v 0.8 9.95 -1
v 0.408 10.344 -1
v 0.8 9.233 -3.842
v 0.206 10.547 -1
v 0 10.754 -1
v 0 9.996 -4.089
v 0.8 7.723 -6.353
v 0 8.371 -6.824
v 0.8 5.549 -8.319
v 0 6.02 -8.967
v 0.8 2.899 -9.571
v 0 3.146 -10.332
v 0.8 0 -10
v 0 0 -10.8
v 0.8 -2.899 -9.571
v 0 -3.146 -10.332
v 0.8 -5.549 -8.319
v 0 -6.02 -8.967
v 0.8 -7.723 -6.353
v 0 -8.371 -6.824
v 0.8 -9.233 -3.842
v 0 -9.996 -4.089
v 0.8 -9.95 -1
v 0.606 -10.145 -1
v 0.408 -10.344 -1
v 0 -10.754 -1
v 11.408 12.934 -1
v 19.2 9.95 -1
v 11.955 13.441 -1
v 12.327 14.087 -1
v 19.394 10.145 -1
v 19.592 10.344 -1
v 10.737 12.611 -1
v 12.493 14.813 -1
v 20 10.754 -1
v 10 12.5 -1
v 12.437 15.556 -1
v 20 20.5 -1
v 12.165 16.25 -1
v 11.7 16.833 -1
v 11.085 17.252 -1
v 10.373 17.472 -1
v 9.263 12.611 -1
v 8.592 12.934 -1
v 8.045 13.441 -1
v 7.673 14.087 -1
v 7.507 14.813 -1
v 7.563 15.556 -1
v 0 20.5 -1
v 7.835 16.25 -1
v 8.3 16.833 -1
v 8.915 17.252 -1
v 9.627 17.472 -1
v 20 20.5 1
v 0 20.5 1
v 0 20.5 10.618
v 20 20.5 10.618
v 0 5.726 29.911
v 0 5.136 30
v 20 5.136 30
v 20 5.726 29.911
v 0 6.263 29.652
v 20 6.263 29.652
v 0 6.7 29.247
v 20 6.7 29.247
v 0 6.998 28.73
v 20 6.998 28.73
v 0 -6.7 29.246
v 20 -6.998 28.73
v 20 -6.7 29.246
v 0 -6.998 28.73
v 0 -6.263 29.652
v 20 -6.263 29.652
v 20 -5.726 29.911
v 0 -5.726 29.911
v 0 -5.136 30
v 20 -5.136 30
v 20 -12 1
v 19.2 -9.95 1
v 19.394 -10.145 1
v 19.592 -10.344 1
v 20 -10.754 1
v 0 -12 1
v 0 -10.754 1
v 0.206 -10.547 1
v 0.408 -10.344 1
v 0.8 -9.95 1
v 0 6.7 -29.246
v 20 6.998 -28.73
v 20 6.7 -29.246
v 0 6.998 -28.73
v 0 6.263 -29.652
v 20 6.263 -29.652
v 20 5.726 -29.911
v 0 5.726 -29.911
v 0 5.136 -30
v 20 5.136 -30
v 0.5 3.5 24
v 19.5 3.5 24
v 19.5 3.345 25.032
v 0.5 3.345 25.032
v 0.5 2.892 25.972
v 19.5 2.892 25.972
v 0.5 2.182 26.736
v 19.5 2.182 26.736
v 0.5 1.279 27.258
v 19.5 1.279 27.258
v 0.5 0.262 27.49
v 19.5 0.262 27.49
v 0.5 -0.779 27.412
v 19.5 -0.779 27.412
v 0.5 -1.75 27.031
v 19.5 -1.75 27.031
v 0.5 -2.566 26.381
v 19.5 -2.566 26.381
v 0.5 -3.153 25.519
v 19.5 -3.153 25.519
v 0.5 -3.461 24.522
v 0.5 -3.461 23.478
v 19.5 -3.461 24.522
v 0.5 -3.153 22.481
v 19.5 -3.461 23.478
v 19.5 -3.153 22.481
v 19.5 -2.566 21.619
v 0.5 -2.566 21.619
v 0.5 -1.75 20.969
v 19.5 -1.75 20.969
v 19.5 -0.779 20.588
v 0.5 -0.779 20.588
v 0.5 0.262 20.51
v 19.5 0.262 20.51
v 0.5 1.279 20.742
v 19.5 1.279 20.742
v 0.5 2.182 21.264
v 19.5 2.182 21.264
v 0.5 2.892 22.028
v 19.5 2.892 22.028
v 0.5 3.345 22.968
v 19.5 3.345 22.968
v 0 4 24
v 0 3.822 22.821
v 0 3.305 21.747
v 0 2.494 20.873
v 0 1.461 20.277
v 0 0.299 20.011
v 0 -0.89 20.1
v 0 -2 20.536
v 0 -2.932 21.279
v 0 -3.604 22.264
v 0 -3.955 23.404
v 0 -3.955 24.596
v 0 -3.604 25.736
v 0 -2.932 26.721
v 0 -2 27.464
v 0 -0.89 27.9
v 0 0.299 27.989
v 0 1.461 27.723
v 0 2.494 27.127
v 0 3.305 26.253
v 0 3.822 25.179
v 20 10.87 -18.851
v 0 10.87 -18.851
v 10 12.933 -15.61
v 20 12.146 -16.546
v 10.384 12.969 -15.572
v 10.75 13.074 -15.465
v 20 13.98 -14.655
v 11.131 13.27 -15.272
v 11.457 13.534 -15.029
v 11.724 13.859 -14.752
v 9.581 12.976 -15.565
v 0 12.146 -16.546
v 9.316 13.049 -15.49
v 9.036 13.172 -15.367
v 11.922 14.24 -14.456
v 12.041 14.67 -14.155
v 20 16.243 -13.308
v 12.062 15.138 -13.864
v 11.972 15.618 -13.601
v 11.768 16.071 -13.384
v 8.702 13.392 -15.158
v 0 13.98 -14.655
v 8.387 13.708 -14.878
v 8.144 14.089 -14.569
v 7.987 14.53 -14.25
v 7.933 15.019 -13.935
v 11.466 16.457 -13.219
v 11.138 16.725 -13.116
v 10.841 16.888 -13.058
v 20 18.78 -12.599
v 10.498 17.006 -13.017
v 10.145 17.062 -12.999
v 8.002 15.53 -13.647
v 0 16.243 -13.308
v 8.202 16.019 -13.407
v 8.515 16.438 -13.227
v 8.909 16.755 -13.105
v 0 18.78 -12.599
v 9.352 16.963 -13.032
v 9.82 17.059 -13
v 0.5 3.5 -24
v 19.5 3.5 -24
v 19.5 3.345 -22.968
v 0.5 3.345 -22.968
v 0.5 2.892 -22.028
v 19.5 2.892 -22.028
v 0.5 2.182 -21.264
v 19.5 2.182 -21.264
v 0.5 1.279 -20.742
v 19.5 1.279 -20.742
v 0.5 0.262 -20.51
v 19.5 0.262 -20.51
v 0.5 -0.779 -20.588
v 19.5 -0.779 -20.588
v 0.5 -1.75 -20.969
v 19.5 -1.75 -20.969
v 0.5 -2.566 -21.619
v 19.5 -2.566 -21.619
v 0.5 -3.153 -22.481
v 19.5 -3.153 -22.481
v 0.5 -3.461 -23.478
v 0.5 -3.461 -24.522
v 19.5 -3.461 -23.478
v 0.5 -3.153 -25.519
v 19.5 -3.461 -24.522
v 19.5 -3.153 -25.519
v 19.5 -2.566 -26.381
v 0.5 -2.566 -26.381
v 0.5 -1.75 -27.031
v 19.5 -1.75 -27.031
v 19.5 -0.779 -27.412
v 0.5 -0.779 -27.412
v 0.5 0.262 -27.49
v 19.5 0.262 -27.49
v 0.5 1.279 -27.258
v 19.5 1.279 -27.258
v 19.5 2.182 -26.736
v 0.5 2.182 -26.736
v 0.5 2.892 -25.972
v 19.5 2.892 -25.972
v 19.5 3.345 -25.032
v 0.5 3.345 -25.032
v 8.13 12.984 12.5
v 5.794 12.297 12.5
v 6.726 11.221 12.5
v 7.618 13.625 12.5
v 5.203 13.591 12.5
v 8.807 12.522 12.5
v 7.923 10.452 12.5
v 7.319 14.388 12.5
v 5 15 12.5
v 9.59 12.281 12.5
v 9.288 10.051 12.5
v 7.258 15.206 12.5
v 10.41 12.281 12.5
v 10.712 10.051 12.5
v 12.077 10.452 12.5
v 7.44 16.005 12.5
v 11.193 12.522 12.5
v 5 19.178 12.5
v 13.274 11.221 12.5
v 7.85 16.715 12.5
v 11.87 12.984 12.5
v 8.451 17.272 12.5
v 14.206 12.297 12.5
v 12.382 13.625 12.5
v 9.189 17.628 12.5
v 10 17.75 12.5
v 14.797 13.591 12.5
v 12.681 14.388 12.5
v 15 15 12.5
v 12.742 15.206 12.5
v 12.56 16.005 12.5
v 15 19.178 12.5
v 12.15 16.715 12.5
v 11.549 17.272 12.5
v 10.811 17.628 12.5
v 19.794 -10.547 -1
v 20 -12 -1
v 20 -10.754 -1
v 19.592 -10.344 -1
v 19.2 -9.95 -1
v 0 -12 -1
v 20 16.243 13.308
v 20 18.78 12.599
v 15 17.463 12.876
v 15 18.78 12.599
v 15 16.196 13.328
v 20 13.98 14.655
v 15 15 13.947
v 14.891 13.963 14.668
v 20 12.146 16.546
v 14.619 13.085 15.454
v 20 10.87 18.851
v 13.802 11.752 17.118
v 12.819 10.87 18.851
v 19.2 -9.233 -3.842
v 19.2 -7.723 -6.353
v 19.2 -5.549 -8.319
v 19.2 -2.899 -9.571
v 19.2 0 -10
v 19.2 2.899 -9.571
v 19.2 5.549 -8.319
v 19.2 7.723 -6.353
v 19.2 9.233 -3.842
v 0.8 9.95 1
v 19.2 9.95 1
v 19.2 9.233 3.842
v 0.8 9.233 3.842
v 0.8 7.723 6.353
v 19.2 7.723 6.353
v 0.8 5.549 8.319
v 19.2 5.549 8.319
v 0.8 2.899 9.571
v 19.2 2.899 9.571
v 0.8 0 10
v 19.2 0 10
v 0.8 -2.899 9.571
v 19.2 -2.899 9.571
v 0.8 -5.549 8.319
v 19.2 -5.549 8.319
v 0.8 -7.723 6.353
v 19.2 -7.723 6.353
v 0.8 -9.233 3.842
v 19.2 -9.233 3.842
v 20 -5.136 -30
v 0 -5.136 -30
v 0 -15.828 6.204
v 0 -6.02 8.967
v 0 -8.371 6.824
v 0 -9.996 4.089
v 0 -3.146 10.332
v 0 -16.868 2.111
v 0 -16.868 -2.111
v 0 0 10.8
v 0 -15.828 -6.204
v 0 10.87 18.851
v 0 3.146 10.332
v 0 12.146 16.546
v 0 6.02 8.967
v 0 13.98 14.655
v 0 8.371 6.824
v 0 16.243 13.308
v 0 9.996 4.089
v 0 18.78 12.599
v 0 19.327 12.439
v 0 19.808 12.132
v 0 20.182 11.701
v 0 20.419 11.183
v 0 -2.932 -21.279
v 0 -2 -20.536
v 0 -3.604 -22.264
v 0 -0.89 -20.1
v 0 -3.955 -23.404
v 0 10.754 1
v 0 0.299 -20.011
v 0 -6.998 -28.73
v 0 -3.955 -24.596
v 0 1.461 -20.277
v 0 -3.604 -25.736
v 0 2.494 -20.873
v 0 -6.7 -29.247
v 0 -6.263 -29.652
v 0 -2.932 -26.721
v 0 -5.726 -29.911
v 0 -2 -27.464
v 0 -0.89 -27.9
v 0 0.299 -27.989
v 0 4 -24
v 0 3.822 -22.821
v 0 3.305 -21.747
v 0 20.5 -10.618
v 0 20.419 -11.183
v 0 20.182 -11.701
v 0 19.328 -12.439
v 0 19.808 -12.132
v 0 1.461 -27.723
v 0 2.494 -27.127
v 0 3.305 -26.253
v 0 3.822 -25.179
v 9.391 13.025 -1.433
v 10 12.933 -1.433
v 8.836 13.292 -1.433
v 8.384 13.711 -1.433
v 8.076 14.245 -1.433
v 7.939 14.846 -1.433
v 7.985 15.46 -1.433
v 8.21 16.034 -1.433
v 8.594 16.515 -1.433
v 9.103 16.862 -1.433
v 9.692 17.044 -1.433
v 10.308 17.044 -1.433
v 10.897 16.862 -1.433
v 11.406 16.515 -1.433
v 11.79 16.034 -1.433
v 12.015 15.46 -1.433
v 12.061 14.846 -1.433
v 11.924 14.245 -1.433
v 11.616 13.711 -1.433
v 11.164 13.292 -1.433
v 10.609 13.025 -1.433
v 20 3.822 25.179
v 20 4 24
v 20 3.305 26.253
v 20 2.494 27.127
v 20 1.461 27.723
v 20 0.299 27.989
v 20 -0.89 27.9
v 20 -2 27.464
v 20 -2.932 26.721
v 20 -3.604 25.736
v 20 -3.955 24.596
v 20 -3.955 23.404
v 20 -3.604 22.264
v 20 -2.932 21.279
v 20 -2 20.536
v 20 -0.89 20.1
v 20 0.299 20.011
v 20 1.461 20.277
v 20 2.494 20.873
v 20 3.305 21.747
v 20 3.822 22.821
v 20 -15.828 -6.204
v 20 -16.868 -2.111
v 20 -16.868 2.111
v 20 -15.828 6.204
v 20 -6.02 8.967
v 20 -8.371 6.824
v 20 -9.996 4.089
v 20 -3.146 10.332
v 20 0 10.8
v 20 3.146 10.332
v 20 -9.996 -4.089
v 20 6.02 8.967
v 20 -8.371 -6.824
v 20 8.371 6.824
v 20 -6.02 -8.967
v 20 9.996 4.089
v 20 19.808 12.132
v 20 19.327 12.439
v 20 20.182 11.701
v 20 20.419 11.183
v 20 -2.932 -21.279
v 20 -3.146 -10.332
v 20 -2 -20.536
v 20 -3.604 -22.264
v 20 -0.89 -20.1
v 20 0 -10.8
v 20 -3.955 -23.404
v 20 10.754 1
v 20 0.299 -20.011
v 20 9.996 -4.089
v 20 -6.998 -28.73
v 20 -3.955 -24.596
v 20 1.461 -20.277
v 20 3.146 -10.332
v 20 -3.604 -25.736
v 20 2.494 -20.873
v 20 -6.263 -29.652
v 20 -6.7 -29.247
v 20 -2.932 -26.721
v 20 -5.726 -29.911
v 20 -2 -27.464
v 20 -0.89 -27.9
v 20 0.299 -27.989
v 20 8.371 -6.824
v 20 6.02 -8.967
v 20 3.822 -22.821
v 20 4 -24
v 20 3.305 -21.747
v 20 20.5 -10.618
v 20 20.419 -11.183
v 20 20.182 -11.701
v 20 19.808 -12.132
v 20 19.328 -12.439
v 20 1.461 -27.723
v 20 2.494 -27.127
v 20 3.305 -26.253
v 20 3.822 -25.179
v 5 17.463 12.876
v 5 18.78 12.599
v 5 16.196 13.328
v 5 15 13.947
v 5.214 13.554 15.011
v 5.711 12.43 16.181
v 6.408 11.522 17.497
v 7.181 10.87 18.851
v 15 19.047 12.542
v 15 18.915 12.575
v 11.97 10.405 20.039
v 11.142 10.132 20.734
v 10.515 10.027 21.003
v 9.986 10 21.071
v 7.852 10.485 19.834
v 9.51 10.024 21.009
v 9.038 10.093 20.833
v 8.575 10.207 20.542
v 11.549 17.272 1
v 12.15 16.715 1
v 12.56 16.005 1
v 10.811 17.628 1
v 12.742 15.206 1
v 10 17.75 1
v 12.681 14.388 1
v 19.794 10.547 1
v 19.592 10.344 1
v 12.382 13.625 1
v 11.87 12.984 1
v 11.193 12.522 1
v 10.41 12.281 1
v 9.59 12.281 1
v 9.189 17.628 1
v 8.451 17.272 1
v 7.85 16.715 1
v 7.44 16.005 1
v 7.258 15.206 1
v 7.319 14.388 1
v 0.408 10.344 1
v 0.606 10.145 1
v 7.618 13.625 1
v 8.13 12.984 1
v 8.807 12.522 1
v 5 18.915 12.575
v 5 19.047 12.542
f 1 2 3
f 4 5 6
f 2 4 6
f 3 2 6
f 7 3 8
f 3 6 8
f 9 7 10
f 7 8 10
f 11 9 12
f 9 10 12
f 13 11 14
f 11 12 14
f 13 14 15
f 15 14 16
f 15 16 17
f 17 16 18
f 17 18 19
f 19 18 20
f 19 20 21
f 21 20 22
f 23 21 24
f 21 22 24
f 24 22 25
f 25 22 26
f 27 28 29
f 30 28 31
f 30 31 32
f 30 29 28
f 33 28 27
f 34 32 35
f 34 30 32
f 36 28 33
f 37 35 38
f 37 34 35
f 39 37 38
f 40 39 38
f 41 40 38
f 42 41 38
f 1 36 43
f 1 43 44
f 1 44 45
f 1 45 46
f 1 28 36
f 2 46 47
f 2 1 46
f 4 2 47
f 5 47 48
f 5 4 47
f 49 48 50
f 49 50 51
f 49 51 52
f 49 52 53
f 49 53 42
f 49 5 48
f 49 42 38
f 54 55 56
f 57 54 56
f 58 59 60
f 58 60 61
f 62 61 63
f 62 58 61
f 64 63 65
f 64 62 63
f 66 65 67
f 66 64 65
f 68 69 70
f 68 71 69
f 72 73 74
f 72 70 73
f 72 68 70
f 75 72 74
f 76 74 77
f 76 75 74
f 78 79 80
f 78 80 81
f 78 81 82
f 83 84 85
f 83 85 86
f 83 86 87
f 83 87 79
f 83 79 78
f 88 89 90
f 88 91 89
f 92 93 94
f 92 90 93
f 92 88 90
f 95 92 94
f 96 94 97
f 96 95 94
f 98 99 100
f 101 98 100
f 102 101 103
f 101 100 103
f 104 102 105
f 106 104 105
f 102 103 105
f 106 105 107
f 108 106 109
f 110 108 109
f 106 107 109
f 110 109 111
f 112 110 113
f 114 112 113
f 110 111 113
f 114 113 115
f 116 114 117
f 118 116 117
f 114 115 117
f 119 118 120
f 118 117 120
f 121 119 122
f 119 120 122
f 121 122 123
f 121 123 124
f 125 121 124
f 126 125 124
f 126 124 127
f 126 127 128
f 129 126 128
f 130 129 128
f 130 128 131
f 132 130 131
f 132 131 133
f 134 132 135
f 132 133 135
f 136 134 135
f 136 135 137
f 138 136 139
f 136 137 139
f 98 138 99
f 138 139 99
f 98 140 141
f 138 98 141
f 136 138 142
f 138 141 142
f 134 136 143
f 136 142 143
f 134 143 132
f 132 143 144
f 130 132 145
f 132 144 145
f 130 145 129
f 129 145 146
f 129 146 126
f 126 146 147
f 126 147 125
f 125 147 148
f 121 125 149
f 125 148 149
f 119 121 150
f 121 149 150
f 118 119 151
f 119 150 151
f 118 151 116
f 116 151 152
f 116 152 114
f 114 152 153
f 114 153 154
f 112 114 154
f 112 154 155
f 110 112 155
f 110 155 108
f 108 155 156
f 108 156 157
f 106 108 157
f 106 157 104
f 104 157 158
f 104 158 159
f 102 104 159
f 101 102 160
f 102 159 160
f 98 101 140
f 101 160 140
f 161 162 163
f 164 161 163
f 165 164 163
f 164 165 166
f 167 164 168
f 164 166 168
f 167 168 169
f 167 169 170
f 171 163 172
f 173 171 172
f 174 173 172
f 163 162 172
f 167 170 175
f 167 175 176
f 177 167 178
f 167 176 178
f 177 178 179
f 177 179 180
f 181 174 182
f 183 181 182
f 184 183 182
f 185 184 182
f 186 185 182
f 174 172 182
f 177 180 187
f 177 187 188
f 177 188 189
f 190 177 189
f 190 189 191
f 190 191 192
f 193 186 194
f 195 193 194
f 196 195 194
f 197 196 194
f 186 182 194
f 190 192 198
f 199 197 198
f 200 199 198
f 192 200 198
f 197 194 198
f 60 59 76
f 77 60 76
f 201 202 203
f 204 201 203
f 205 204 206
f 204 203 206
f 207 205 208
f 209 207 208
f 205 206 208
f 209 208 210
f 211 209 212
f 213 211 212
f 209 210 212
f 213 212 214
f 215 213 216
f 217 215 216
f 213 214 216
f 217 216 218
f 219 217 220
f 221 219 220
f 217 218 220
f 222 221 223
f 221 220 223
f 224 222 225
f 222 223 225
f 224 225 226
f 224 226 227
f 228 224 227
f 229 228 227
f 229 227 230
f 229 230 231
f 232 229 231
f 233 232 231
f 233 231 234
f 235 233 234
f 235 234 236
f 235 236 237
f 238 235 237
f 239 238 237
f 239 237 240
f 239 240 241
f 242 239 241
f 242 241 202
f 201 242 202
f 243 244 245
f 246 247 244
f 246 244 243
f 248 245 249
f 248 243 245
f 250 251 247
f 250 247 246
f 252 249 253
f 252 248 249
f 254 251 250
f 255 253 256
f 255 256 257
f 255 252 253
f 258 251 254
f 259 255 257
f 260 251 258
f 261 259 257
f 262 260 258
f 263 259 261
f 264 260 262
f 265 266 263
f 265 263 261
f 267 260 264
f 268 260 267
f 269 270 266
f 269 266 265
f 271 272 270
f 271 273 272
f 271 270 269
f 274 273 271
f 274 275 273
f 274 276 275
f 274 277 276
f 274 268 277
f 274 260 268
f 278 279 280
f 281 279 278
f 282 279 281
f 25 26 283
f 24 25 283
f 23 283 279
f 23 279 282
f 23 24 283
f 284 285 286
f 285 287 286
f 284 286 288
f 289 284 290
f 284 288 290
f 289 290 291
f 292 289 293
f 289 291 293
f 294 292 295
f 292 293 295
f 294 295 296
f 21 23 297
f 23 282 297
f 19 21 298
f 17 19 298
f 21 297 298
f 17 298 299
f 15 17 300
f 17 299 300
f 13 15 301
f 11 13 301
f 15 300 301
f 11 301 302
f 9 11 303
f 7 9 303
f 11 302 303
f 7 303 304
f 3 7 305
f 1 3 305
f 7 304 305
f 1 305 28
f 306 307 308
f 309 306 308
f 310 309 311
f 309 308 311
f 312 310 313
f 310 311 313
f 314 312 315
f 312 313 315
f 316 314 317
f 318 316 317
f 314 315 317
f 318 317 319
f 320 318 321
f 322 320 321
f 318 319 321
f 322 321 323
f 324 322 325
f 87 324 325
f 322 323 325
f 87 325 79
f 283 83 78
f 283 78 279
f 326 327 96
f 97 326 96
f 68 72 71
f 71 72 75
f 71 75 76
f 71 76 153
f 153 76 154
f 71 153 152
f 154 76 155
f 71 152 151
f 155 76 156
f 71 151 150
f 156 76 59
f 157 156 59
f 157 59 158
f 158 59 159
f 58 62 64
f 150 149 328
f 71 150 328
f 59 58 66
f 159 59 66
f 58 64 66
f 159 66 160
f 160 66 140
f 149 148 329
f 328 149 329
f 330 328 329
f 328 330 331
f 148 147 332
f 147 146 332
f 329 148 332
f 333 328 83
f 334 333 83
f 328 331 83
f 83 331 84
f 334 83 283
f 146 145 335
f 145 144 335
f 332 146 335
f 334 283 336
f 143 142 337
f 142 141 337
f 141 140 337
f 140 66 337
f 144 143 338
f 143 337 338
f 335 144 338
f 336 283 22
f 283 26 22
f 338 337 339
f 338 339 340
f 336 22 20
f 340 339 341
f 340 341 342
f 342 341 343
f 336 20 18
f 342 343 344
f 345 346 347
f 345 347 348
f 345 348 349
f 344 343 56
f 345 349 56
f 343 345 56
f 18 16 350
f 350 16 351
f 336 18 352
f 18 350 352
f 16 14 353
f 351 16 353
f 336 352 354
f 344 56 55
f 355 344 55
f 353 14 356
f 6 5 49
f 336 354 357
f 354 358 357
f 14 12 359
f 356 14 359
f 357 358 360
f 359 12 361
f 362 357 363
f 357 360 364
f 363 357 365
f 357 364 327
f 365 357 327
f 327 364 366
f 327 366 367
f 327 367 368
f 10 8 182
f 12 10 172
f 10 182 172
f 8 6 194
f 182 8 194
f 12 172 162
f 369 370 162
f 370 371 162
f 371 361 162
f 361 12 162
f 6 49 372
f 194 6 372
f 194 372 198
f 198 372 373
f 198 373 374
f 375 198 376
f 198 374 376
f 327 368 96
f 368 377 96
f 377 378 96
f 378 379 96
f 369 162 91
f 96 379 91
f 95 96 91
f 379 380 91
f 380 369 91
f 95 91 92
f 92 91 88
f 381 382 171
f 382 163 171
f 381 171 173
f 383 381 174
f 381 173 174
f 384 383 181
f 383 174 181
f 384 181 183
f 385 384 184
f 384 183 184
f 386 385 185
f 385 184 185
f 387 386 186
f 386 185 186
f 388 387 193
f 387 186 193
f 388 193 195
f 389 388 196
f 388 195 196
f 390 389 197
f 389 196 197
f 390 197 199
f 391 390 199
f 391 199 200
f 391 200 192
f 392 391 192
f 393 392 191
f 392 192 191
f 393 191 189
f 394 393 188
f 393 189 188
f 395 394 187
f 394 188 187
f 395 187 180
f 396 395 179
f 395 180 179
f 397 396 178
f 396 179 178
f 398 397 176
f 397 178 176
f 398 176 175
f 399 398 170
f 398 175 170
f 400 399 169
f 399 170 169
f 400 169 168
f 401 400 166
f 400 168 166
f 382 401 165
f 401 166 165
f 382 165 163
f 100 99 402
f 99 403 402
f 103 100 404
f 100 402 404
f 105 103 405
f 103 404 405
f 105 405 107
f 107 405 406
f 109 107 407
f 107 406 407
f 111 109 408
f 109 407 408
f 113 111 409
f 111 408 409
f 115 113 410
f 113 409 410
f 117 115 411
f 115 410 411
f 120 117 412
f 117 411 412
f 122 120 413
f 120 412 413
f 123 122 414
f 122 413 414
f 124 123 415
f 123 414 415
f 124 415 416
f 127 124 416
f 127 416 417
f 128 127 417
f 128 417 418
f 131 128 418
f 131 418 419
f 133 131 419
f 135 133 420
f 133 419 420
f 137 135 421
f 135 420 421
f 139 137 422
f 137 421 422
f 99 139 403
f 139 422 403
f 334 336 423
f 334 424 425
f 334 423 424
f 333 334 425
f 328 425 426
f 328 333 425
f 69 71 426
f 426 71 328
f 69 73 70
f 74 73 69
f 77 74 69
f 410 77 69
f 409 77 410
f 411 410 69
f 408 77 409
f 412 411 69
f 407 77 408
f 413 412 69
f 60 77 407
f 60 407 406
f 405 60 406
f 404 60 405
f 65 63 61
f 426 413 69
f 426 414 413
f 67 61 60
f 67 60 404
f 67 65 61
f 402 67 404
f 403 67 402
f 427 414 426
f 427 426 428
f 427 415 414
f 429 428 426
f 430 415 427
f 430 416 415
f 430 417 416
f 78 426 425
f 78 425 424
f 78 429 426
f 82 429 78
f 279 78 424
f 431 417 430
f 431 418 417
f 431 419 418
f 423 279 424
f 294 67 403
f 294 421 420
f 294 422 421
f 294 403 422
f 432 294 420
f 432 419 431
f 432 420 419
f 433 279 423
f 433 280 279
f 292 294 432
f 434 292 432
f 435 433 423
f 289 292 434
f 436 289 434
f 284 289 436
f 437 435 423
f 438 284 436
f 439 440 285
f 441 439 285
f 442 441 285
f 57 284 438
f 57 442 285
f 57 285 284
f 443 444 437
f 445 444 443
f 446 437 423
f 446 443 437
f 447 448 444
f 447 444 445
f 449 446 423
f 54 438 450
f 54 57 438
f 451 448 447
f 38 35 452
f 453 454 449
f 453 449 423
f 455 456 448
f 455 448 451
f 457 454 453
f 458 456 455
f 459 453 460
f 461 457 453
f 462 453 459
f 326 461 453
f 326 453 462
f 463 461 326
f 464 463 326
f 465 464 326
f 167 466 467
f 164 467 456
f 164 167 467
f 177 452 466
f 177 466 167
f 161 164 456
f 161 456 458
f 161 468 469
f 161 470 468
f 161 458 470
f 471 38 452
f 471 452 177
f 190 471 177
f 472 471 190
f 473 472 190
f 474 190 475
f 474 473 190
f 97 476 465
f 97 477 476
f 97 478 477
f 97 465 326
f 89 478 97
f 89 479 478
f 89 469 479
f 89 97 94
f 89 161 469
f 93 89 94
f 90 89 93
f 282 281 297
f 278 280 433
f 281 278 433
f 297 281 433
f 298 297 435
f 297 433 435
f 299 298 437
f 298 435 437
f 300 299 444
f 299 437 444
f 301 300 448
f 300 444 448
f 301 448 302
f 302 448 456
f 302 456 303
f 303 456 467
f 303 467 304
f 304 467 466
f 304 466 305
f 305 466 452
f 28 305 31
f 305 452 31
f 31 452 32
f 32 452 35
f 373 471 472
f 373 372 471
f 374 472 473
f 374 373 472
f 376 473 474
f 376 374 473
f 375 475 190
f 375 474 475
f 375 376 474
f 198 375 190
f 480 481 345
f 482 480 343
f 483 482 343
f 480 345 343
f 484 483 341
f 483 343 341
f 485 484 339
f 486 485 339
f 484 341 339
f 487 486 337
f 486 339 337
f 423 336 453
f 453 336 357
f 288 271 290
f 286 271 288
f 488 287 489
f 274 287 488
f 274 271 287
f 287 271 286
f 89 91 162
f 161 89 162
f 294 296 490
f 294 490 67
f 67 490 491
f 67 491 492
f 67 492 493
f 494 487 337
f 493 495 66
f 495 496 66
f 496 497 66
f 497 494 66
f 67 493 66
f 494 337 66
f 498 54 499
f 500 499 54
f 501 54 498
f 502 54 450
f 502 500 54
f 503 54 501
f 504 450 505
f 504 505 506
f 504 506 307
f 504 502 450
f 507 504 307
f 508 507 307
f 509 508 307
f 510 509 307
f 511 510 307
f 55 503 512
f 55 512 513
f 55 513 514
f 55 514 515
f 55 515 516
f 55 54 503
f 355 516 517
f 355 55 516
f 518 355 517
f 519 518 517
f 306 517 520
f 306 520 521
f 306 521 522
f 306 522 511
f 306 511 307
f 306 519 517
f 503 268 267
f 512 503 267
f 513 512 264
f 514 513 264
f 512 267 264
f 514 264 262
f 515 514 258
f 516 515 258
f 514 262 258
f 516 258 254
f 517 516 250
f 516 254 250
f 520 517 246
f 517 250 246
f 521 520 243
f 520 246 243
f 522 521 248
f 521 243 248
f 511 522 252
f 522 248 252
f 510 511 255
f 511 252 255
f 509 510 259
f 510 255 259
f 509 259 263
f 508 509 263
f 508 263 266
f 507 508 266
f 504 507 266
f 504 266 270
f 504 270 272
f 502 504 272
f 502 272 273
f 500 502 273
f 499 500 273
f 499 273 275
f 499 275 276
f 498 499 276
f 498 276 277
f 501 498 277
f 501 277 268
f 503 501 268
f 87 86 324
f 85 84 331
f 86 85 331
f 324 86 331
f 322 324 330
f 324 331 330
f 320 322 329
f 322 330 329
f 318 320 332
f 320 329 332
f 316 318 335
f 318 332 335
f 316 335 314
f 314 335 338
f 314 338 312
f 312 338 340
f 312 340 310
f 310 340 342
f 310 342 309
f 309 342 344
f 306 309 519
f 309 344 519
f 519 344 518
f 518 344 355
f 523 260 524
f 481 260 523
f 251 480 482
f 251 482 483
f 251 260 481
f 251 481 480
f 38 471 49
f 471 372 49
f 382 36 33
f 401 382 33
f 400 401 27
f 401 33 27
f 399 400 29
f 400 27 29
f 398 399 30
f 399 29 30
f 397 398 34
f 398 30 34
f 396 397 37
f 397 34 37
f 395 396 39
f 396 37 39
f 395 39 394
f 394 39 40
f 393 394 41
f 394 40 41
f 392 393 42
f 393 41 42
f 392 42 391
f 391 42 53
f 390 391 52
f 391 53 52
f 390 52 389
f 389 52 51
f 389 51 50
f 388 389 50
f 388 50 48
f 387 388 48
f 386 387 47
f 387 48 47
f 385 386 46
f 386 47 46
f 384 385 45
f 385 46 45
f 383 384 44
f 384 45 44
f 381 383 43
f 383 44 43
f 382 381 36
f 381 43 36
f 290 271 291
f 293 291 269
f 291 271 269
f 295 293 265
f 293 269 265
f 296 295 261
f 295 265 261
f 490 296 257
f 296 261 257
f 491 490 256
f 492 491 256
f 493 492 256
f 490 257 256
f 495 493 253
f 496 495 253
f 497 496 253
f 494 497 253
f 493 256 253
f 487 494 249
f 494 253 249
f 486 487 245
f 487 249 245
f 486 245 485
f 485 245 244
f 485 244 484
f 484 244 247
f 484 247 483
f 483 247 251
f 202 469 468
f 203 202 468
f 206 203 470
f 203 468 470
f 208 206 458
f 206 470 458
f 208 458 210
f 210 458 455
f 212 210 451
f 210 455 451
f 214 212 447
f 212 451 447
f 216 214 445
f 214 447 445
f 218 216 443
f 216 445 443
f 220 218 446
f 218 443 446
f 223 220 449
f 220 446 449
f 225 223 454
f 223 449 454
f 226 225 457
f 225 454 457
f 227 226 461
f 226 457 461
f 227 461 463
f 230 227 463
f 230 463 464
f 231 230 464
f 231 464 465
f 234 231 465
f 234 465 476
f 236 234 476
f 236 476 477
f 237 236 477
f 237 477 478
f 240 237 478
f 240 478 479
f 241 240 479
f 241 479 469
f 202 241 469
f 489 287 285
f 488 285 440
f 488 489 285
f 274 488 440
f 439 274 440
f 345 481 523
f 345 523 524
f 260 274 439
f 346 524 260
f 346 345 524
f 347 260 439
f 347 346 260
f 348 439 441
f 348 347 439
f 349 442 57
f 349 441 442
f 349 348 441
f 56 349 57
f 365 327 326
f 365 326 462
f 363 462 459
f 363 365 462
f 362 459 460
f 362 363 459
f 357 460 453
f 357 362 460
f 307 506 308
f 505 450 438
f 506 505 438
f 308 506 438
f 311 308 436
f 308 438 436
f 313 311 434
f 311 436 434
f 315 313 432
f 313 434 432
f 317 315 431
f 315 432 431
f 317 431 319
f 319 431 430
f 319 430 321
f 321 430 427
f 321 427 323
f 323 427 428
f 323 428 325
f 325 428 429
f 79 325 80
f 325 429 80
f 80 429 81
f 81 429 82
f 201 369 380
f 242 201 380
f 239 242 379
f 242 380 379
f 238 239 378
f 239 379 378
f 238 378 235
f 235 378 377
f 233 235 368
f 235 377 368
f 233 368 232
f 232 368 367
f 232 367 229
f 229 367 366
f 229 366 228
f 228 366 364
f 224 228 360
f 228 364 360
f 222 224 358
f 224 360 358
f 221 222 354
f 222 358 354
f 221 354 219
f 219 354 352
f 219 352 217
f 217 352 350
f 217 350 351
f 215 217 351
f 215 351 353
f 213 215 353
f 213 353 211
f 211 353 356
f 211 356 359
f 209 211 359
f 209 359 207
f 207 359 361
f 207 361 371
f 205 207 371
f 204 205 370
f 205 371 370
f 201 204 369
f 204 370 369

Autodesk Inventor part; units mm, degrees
sketch "_____8" plane through (0, 0, 0) normal (1, 0, 0) x (0, 0, -1)
  line L0 (-30, 5.1358) -> (-30, -5.1358)
  arc A0 (-30, -5.1358) -> (-28.7299, -6.9979) centre (-28, -5.1358) ccw
  line L1 (-28.7299, -6.9979) -> (-6.204, -15.8275)
  arc A1 (-6.204, -15.8275) -> (6.204, -15.8275) centre (0, 0) ccw
  line L2 (6.204, -15.8275) -> (28.7299, -6.9979)
  arc A2 (28.7299, -6.9979) -> (30, -5.1358) centre (28, -5.1358) ccw
  line L3 (30, -5.1358) -> (30, 5.1358)
  arc A3 (30, 5.1358) -> (28.7299, 6.9979) centre (28, 5.1358) ccw
  line L4 (28.7299, 6.9979) -> (18.8506, 10.8703)
  arc A4 (12.5986, 18.7801) -> (18.8506, 10.8703) centre (22.5, 20.1806) ccw
  arc A5 (12.5986, 18.7801) -> (10.6183, 20.5) centre (10.6183, 18.5) ccw
  line L5 (10.6183, 20.5) -> (-10.6183, 20.5)
  arc A6 (-10.6183, 20.5) -> (-12.5986, 18.7801) centre (-10.6183, 18.5) ccw
  arc A7 (-18.8506, 10.8703) -> (-12.5986, 18.7801) centre (-22.5, 20.1806) ccw
  line L6 (-18.8506, 10.8703) -> (-28.7299, 6.9979)
  arc A8 (-28.7299, 6.9979) -> (-30, 5.1358) centre (-28, 5.1358) ccw
extrude "Extrusion1" add sketch "_____8" along normal blind 20
sketch "_____2" plane through (0, 0, 0) normal (1, 0, 0) x (0, 0, -1)
  line L0 (-1, 37.5) -> (-1, -12)
  line L1 (-1, -12) -> (1, -12)
  line L2 (1, -12) -> (1, 37.5)
  line L3 (1, 37.5) -> (-1, 37.5)
extrude "Extrusion2" cut sketch "_____2" along normal blind 20
sketch "_____3" plane through (0, 0, 0) normal (0, 0, 1) x (1, 0, 0)
  line L0 (20, 0) -> (0, 0)
  line L1 (0, 0) -> (0, 10.8)
  line L2 (0, 10.8) -> (0.8, 10)
  line L3 (0.8, 10) -> (19.2, 10)
  line L4 (19.2, 10) -> (20, 10.8)
  line L5 (20, 10.8) -> (20, 0)
  line L6 (20, 0) -> (0, 0)
revolve "Revolution1" cut sketch "_____3" angle 360 about axis through (20, 0, 0) along (1, 0, 0)
sketch "_____4" plane through (0, 0, 24) normal (0, 0, 1) x (1, 0, 0)
  line L0 (20, 0) -> (0, 0)
  line L1 (0, 0) -> (0, 4)
  line L2 (0, 4) -> (0.5, 3.5)
  line L3 (0.5, 3.5) -> (19.5, 3.5)
  line L4 (19.5, 3.5) -> (20, 4)
  line L5 (20, 4) -> (20, 0)
  line L6 (20, 0) -> (0, 0)
revolve "Revolution2" cut sketch "_____4" angle 360 about axis through (20, 0, 24) along (1, 0, 0)
pattern_linear "Rectangular Pattern1" count 2 spacing 48 along (0, 0, -1) of "Revolution2"
sketch "Sketch5" plane through (0, 20.5, -1) normal (0, 0, 1) x (1, 0, 0)
  point P0 (10, -5.5)
hole "Hole1" at (10, 15, -1) direction (0, 0, -1) diameter 4.134 depth 16.5 countersink diameter 5 countersink angle 90 thread size "M5x0.8" class "6H" standard "ISO Metric profile"
sketch "Sketch6" plane through (20, 20.5, 1) normal (0, 0, -1) x (-1, 0, 0)
  point P0 (10, -5.5)
hole "Hole2" at (10, 15, 1) direction (0, 0, 1) diameter 5.5 depth 25
sketch "_____9" plane through (0, 0, 12.5) normal (0, 0, 1) x (1, 0, 0)
  line L0 (5, 33.75) -> (5, 15)
  arc A0 (5, 15) -> (15, 15) centre (10, 15) ccw
  line L1 (15, 15) -> (15, 33.75)
  line L2 (15, 33.75) -> (5, 33.75)
extrude "Extrusion3" cut sketch "_____9" along normal blind 20
ref_plane "to_bolt_XY" through (10, 15, 12.5) normal (0, 0, 1) x (1, 0, 0)
ref_plane "to_bolt_YZ" through (10, 15, 12.5) normal (1, 0, 0) x (0, 1, 0)
ref_plane "to_bolt_ZX" through (10, 15, 12.5) normal (0, 1, 0) x (0, 0, 1)
properties part number "C-SHFMQ20_b"
